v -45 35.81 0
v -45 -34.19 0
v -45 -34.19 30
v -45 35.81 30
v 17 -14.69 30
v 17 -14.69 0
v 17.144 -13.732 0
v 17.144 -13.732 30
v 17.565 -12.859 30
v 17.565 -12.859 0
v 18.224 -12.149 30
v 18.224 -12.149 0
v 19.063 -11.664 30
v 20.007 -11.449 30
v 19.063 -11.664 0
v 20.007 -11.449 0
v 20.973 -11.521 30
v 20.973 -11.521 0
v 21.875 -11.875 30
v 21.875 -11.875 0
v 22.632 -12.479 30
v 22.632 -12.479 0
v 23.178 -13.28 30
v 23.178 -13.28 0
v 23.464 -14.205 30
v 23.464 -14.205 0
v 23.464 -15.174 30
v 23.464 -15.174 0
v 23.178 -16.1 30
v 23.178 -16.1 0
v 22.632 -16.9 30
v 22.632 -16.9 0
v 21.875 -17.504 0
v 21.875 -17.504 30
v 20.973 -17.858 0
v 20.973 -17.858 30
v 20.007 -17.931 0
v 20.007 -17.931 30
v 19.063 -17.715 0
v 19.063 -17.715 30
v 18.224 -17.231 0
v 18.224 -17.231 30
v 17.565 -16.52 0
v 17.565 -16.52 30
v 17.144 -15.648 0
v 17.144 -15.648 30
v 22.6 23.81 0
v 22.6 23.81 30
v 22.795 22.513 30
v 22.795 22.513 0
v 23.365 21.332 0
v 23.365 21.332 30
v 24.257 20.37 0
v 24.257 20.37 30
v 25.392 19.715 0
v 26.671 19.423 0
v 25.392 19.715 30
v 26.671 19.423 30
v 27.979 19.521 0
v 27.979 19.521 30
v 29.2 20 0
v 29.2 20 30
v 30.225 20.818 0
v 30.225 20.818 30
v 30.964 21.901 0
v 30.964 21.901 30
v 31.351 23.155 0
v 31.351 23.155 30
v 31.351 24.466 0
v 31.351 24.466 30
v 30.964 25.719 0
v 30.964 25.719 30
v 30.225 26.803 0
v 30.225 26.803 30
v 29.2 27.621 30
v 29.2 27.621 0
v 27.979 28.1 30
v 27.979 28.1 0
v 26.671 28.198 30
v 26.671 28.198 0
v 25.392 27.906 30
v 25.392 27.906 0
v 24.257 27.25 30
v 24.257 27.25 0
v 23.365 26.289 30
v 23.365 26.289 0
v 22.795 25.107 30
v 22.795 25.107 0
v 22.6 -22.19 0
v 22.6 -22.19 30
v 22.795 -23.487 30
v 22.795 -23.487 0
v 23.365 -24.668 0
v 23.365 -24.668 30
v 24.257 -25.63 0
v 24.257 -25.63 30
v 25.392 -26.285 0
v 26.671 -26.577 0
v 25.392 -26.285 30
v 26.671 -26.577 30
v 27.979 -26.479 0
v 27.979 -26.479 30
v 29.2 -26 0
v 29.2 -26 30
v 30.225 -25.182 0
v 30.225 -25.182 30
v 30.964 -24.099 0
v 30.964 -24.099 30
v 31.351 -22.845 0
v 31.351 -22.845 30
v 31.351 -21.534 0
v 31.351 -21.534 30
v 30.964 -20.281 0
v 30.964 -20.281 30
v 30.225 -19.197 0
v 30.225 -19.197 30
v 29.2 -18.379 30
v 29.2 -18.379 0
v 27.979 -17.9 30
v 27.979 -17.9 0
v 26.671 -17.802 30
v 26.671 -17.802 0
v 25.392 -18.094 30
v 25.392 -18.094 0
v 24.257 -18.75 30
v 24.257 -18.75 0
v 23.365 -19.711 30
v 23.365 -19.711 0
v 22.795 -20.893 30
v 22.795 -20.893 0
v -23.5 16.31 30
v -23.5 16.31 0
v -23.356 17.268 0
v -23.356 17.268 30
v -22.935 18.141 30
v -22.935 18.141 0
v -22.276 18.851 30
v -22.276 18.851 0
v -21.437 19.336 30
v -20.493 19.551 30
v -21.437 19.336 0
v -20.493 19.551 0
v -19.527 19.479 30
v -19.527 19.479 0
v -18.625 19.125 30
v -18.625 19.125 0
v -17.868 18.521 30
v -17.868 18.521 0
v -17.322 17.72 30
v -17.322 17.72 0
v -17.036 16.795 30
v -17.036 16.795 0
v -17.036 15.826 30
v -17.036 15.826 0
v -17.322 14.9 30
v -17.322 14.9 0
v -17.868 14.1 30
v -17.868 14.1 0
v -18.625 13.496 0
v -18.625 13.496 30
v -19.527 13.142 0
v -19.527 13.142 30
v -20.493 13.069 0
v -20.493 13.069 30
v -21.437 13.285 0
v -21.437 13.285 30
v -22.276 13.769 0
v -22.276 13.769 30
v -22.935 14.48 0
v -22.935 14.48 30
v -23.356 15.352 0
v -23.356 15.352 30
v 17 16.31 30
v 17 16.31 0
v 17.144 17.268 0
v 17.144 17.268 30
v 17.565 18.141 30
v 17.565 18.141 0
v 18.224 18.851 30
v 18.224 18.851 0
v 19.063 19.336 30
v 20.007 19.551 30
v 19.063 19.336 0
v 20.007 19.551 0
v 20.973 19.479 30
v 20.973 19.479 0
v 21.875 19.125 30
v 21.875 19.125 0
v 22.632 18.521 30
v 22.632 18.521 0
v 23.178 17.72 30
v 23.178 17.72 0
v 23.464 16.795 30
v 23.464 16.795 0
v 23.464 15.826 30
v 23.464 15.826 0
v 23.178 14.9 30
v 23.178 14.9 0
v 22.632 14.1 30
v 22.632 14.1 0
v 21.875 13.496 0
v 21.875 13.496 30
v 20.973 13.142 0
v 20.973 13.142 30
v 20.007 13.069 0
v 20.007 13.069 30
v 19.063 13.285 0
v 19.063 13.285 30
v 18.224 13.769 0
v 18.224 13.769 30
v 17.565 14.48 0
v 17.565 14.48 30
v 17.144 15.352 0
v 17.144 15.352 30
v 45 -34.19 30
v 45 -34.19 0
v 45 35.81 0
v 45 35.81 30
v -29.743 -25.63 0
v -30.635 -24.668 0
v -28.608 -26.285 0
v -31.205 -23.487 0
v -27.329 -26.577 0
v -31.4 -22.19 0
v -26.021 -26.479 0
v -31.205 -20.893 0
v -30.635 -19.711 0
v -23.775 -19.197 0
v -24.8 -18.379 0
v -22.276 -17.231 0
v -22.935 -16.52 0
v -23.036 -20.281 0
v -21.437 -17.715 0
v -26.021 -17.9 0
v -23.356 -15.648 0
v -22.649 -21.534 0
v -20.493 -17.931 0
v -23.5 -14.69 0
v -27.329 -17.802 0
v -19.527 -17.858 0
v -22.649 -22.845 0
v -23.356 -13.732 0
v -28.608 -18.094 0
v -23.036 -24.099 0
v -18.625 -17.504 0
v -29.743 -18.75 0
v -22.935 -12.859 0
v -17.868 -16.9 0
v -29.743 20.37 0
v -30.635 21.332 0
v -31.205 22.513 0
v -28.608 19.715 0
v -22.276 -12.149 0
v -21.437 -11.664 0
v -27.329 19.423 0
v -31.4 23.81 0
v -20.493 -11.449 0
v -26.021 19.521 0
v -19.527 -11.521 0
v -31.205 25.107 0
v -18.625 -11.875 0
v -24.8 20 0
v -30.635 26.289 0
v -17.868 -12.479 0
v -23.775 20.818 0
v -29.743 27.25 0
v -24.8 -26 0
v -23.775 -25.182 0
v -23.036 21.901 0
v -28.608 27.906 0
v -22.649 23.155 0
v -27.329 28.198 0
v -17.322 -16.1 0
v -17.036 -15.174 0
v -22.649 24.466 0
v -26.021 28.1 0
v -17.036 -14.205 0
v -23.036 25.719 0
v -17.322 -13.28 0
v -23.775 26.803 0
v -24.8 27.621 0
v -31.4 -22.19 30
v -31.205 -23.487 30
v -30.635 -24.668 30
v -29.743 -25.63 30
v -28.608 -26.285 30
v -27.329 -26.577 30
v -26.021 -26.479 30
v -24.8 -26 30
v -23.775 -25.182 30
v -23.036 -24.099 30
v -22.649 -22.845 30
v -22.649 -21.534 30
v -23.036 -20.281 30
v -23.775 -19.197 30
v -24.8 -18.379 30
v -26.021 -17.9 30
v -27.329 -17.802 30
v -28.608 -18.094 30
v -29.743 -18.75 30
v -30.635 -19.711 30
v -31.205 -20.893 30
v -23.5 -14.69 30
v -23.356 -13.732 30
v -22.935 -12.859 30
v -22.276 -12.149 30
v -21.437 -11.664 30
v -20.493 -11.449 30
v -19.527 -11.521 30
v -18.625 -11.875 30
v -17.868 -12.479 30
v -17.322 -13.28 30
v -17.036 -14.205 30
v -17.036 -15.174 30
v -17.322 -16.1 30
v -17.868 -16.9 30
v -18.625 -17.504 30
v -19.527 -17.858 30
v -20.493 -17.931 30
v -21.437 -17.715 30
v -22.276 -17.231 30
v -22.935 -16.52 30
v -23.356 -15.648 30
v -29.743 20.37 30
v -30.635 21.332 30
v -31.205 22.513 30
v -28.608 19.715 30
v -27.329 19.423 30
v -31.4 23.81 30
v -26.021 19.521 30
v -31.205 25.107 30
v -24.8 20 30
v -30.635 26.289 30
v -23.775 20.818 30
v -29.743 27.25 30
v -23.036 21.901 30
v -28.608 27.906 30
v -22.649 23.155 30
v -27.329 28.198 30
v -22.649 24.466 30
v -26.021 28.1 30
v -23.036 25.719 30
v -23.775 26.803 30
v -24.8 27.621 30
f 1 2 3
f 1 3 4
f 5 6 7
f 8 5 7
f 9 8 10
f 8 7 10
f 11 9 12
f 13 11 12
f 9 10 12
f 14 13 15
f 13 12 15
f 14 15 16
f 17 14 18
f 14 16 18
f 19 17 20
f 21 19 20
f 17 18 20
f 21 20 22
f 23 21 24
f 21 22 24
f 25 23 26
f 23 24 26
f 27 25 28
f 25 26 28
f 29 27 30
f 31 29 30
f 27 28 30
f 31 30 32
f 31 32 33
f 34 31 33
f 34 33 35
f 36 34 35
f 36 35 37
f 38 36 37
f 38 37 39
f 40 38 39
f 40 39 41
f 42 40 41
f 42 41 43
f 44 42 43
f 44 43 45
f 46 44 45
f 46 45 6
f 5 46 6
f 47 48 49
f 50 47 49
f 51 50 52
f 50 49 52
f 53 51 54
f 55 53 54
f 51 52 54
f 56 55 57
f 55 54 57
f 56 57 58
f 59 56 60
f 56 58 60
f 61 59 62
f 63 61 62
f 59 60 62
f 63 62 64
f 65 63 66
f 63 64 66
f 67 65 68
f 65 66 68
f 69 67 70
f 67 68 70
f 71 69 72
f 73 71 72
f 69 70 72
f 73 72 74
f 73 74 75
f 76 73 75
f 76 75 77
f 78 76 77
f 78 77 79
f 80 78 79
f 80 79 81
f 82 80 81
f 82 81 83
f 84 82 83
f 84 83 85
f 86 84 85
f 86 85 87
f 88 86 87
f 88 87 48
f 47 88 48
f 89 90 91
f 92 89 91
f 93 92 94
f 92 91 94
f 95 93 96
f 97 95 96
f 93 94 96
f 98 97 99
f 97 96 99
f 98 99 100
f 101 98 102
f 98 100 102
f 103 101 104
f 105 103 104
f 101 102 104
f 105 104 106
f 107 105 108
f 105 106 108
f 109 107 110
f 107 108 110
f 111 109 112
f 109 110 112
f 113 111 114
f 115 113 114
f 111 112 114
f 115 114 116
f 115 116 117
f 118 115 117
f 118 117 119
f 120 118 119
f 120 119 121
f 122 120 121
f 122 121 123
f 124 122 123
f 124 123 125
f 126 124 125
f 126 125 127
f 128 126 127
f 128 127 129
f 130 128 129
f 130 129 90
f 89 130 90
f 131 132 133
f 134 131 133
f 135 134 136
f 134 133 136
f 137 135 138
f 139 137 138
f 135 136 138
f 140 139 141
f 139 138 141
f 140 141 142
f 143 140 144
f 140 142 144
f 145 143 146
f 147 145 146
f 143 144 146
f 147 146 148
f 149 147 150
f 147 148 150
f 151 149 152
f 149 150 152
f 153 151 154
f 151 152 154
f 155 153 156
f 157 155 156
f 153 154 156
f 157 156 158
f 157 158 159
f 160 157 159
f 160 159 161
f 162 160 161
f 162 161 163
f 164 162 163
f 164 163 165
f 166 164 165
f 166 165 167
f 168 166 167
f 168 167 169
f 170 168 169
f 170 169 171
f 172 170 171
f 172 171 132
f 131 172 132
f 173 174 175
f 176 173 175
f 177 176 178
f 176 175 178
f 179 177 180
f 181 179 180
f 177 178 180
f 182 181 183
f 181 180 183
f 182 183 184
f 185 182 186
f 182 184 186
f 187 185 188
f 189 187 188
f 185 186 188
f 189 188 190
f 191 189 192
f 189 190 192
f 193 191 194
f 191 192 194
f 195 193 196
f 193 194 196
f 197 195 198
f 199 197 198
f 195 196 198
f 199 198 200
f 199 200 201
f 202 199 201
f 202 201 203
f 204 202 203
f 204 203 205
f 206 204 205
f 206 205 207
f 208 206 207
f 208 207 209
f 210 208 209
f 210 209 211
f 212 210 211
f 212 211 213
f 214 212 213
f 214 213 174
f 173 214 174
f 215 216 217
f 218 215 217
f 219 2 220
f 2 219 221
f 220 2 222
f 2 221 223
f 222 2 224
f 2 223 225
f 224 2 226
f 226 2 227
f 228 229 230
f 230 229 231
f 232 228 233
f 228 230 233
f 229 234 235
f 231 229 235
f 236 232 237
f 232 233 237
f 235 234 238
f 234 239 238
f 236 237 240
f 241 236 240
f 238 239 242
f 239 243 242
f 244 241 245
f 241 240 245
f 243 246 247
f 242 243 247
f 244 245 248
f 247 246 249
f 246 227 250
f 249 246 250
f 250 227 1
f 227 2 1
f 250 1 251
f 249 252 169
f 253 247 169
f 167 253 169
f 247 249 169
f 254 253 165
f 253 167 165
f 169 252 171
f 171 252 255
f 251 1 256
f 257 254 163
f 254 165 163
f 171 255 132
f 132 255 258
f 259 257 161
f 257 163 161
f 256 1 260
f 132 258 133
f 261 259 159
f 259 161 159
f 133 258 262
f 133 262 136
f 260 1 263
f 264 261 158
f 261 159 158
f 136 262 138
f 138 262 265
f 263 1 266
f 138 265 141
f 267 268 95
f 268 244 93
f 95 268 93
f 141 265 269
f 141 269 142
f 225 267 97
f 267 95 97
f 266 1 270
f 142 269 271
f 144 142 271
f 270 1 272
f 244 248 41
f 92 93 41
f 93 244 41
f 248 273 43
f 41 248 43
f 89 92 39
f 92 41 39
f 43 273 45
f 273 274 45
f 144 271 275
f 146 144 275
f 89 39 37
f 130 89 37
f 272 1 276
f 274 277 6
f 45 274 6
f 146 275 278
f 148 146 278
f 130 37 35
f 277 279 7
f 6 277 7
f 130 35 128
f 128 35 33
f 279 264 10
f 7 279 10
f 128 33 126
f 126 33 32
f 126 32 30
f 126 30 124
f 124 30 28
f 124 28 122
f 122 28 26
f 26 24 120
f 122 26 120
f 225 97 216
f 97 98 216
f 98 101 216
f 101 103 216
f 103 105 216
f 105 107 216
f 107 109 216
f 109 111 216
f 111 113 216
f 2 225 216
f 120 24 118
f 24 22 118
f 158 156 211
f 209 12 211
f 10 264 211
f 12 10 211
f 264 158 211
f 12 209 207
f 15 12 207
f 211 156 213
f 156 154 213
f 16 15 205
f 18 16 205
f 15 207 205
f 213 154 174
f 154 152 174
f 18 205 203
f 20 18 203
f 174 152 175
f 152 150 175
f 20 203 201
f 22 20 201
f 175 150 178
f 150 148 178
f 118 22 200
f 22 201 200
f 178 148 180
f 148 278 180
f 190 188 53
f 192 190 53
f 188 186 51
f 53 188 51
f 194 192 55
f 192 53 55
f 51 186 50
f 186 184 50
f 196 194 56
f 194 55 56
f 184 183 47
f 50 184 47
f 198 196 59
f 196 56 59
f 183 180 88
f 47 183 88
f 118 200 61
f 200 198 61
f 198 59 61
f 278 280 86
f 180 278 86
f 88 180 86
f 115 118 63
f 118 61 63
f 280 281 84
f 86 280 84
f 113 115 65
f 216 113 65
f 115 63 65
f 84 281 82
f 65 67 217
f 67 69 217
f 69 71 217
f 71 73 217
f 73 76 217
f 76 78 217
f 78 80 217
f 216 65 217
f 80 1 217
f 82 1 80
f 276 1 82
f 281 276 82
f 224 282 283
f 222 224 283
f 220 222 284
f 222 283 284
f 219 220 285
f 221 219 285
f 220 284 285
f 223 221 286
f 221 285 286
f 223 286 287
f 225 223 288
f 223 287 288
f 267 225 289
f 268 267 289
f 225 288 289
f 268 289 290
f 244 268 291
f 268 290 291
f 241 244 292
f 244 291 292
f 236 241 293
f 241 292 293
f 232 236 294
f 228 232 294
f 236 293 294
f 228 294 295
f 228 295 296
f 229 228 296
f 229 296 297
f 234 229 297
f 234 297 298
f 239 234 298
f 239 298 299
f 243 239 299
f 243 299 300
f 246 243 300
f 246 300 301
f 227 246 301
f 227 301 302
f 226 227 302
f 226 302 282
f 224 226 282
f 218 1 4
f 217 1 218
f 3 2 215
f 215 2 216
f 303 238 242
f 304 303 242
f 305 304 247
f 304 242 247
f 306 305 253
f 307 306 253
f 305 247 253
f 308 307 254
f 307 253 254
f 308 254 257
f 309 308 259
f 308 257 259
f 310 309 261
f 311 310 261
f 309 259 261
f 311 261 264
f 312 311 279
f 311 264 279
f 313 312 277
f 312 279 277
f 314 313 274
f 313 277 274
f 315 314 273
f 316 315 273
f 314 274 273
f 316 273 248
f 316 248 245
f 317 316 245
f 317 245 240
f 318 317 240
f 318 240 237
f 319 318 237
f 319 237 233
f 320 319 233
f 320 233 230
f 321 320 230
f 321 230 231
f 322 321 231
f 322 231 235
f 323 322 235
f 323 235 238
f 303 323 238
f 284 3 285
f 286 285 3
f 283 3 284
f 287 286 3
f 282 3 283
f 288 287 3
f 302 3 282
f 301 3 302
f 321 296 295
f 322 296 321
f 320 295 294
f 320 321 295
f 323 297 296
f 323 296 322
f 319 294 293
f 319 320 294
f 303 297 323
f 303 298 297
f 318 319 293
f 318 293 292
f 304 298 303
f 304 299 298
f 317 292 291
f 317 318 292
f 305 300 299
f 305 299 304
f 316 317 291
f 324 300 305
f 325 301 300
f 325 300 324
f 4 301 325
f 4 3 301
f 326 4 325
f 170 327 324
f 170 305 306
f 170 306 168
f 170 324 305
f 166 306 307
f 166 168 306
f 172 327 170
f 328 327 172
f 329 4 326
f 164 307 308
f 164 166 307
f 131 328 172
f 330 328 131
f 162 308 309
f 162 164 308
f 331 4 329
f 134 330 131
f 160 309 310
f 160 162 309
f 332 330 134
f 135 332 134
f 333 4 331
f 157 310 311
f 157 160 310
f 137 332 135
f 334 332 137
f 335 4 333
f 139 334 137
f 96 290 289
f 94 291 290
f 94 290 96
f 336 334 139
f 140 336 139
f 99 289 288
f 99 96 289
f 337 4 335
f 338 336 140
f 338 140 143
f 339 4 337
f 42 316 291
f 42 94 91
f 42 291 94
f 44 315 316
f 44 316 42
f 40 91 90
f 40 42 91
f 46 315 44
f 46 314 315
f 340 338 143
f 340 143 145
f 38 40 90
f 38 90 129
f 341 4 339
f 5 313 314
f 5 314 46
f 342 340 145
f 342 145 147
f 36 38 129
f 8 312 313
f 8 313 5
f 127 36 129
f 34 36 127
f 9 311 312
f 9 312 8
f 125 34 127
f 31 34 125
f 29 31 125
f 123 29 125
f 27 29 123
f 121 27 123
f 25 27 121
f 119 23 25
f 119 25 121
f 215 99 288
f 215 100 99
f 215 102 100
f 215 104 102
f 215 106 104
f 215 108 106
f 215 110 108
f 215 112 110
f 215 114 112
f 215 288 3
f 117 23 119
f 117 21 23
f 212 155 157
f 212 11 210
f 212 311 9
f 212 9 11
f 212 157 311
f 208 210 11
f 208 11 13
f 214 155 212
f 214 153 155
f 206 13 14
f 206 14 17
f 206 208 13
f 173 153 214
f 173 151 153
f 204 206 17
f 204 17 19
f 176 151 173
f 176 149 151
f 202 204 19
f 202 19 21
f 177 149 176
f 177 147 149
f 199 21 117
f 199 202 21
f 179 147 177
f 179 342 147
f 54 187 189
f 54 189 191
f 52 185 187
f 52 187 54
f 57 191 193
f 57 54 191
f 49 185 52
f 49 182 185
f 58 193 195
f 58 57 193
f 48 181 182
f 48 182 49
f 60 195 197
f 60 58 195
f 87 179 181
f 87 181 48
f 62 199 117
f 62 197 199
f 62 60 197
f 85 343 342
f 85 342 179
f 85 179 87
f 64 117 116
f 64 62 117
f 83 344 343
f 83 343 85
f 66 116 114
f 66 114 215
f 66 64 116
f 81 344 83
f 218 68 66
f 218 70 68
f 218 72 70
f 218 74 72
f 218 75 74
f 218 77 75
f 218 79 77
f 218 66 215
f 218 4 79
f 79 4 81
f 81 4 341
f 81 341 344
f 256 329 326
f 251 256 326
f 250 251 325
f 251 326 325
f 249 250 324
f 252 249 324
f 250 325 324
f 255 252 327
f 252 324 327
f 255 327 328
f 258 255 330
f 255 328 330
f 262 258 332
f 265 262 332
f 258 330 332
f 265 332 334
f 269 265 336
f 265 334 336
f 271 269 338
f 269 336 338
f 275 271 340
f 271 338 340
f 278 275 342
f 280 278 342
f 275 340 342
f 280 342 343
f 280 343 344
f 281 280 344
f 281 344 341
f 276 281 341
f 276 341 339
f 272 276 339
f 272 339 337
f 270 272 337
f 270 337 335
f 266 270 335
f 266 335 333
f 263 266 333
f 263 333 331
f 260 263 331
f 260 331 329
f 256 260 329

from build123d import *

# Parameters (mm, degrees)
F0_W     = 90
F0_H     = 70
F1_DEPTH = 30
F2_D     = 8.8
F4_D     = 6.5


with BuildPart() as f1:
    # F0 (on Top) → F1 (new body)
    with BuildSketch(Plane.XY):
        with Locations((0, 0.8103642613)):
            Rectangle(F0_W, F0_H)
    extrude(amount=F1_DEPTH)

    # F2 (through all)
    with Locations(Plane(origin=(0, 0, 0), x_dir=(1, 0, 0), z_dir=(0, 0, -1))):
        with Locations((-27, -23.8103642613), (-27, 22.1896357387), (27, 22.1896357387), (27, -23.8103642613)):
            Hole(F2_D / 2)

    # F4 (through all)
    with Locations(Plane.XY.offset(30)):
        with Locations((-20.25, 16.3103642613), (-20.25, -14.6896357387), (20.25, -14.6896357387), (20.25, 16.3103642613)):
            Hole(F4_D / 2)


solid = f1.part
